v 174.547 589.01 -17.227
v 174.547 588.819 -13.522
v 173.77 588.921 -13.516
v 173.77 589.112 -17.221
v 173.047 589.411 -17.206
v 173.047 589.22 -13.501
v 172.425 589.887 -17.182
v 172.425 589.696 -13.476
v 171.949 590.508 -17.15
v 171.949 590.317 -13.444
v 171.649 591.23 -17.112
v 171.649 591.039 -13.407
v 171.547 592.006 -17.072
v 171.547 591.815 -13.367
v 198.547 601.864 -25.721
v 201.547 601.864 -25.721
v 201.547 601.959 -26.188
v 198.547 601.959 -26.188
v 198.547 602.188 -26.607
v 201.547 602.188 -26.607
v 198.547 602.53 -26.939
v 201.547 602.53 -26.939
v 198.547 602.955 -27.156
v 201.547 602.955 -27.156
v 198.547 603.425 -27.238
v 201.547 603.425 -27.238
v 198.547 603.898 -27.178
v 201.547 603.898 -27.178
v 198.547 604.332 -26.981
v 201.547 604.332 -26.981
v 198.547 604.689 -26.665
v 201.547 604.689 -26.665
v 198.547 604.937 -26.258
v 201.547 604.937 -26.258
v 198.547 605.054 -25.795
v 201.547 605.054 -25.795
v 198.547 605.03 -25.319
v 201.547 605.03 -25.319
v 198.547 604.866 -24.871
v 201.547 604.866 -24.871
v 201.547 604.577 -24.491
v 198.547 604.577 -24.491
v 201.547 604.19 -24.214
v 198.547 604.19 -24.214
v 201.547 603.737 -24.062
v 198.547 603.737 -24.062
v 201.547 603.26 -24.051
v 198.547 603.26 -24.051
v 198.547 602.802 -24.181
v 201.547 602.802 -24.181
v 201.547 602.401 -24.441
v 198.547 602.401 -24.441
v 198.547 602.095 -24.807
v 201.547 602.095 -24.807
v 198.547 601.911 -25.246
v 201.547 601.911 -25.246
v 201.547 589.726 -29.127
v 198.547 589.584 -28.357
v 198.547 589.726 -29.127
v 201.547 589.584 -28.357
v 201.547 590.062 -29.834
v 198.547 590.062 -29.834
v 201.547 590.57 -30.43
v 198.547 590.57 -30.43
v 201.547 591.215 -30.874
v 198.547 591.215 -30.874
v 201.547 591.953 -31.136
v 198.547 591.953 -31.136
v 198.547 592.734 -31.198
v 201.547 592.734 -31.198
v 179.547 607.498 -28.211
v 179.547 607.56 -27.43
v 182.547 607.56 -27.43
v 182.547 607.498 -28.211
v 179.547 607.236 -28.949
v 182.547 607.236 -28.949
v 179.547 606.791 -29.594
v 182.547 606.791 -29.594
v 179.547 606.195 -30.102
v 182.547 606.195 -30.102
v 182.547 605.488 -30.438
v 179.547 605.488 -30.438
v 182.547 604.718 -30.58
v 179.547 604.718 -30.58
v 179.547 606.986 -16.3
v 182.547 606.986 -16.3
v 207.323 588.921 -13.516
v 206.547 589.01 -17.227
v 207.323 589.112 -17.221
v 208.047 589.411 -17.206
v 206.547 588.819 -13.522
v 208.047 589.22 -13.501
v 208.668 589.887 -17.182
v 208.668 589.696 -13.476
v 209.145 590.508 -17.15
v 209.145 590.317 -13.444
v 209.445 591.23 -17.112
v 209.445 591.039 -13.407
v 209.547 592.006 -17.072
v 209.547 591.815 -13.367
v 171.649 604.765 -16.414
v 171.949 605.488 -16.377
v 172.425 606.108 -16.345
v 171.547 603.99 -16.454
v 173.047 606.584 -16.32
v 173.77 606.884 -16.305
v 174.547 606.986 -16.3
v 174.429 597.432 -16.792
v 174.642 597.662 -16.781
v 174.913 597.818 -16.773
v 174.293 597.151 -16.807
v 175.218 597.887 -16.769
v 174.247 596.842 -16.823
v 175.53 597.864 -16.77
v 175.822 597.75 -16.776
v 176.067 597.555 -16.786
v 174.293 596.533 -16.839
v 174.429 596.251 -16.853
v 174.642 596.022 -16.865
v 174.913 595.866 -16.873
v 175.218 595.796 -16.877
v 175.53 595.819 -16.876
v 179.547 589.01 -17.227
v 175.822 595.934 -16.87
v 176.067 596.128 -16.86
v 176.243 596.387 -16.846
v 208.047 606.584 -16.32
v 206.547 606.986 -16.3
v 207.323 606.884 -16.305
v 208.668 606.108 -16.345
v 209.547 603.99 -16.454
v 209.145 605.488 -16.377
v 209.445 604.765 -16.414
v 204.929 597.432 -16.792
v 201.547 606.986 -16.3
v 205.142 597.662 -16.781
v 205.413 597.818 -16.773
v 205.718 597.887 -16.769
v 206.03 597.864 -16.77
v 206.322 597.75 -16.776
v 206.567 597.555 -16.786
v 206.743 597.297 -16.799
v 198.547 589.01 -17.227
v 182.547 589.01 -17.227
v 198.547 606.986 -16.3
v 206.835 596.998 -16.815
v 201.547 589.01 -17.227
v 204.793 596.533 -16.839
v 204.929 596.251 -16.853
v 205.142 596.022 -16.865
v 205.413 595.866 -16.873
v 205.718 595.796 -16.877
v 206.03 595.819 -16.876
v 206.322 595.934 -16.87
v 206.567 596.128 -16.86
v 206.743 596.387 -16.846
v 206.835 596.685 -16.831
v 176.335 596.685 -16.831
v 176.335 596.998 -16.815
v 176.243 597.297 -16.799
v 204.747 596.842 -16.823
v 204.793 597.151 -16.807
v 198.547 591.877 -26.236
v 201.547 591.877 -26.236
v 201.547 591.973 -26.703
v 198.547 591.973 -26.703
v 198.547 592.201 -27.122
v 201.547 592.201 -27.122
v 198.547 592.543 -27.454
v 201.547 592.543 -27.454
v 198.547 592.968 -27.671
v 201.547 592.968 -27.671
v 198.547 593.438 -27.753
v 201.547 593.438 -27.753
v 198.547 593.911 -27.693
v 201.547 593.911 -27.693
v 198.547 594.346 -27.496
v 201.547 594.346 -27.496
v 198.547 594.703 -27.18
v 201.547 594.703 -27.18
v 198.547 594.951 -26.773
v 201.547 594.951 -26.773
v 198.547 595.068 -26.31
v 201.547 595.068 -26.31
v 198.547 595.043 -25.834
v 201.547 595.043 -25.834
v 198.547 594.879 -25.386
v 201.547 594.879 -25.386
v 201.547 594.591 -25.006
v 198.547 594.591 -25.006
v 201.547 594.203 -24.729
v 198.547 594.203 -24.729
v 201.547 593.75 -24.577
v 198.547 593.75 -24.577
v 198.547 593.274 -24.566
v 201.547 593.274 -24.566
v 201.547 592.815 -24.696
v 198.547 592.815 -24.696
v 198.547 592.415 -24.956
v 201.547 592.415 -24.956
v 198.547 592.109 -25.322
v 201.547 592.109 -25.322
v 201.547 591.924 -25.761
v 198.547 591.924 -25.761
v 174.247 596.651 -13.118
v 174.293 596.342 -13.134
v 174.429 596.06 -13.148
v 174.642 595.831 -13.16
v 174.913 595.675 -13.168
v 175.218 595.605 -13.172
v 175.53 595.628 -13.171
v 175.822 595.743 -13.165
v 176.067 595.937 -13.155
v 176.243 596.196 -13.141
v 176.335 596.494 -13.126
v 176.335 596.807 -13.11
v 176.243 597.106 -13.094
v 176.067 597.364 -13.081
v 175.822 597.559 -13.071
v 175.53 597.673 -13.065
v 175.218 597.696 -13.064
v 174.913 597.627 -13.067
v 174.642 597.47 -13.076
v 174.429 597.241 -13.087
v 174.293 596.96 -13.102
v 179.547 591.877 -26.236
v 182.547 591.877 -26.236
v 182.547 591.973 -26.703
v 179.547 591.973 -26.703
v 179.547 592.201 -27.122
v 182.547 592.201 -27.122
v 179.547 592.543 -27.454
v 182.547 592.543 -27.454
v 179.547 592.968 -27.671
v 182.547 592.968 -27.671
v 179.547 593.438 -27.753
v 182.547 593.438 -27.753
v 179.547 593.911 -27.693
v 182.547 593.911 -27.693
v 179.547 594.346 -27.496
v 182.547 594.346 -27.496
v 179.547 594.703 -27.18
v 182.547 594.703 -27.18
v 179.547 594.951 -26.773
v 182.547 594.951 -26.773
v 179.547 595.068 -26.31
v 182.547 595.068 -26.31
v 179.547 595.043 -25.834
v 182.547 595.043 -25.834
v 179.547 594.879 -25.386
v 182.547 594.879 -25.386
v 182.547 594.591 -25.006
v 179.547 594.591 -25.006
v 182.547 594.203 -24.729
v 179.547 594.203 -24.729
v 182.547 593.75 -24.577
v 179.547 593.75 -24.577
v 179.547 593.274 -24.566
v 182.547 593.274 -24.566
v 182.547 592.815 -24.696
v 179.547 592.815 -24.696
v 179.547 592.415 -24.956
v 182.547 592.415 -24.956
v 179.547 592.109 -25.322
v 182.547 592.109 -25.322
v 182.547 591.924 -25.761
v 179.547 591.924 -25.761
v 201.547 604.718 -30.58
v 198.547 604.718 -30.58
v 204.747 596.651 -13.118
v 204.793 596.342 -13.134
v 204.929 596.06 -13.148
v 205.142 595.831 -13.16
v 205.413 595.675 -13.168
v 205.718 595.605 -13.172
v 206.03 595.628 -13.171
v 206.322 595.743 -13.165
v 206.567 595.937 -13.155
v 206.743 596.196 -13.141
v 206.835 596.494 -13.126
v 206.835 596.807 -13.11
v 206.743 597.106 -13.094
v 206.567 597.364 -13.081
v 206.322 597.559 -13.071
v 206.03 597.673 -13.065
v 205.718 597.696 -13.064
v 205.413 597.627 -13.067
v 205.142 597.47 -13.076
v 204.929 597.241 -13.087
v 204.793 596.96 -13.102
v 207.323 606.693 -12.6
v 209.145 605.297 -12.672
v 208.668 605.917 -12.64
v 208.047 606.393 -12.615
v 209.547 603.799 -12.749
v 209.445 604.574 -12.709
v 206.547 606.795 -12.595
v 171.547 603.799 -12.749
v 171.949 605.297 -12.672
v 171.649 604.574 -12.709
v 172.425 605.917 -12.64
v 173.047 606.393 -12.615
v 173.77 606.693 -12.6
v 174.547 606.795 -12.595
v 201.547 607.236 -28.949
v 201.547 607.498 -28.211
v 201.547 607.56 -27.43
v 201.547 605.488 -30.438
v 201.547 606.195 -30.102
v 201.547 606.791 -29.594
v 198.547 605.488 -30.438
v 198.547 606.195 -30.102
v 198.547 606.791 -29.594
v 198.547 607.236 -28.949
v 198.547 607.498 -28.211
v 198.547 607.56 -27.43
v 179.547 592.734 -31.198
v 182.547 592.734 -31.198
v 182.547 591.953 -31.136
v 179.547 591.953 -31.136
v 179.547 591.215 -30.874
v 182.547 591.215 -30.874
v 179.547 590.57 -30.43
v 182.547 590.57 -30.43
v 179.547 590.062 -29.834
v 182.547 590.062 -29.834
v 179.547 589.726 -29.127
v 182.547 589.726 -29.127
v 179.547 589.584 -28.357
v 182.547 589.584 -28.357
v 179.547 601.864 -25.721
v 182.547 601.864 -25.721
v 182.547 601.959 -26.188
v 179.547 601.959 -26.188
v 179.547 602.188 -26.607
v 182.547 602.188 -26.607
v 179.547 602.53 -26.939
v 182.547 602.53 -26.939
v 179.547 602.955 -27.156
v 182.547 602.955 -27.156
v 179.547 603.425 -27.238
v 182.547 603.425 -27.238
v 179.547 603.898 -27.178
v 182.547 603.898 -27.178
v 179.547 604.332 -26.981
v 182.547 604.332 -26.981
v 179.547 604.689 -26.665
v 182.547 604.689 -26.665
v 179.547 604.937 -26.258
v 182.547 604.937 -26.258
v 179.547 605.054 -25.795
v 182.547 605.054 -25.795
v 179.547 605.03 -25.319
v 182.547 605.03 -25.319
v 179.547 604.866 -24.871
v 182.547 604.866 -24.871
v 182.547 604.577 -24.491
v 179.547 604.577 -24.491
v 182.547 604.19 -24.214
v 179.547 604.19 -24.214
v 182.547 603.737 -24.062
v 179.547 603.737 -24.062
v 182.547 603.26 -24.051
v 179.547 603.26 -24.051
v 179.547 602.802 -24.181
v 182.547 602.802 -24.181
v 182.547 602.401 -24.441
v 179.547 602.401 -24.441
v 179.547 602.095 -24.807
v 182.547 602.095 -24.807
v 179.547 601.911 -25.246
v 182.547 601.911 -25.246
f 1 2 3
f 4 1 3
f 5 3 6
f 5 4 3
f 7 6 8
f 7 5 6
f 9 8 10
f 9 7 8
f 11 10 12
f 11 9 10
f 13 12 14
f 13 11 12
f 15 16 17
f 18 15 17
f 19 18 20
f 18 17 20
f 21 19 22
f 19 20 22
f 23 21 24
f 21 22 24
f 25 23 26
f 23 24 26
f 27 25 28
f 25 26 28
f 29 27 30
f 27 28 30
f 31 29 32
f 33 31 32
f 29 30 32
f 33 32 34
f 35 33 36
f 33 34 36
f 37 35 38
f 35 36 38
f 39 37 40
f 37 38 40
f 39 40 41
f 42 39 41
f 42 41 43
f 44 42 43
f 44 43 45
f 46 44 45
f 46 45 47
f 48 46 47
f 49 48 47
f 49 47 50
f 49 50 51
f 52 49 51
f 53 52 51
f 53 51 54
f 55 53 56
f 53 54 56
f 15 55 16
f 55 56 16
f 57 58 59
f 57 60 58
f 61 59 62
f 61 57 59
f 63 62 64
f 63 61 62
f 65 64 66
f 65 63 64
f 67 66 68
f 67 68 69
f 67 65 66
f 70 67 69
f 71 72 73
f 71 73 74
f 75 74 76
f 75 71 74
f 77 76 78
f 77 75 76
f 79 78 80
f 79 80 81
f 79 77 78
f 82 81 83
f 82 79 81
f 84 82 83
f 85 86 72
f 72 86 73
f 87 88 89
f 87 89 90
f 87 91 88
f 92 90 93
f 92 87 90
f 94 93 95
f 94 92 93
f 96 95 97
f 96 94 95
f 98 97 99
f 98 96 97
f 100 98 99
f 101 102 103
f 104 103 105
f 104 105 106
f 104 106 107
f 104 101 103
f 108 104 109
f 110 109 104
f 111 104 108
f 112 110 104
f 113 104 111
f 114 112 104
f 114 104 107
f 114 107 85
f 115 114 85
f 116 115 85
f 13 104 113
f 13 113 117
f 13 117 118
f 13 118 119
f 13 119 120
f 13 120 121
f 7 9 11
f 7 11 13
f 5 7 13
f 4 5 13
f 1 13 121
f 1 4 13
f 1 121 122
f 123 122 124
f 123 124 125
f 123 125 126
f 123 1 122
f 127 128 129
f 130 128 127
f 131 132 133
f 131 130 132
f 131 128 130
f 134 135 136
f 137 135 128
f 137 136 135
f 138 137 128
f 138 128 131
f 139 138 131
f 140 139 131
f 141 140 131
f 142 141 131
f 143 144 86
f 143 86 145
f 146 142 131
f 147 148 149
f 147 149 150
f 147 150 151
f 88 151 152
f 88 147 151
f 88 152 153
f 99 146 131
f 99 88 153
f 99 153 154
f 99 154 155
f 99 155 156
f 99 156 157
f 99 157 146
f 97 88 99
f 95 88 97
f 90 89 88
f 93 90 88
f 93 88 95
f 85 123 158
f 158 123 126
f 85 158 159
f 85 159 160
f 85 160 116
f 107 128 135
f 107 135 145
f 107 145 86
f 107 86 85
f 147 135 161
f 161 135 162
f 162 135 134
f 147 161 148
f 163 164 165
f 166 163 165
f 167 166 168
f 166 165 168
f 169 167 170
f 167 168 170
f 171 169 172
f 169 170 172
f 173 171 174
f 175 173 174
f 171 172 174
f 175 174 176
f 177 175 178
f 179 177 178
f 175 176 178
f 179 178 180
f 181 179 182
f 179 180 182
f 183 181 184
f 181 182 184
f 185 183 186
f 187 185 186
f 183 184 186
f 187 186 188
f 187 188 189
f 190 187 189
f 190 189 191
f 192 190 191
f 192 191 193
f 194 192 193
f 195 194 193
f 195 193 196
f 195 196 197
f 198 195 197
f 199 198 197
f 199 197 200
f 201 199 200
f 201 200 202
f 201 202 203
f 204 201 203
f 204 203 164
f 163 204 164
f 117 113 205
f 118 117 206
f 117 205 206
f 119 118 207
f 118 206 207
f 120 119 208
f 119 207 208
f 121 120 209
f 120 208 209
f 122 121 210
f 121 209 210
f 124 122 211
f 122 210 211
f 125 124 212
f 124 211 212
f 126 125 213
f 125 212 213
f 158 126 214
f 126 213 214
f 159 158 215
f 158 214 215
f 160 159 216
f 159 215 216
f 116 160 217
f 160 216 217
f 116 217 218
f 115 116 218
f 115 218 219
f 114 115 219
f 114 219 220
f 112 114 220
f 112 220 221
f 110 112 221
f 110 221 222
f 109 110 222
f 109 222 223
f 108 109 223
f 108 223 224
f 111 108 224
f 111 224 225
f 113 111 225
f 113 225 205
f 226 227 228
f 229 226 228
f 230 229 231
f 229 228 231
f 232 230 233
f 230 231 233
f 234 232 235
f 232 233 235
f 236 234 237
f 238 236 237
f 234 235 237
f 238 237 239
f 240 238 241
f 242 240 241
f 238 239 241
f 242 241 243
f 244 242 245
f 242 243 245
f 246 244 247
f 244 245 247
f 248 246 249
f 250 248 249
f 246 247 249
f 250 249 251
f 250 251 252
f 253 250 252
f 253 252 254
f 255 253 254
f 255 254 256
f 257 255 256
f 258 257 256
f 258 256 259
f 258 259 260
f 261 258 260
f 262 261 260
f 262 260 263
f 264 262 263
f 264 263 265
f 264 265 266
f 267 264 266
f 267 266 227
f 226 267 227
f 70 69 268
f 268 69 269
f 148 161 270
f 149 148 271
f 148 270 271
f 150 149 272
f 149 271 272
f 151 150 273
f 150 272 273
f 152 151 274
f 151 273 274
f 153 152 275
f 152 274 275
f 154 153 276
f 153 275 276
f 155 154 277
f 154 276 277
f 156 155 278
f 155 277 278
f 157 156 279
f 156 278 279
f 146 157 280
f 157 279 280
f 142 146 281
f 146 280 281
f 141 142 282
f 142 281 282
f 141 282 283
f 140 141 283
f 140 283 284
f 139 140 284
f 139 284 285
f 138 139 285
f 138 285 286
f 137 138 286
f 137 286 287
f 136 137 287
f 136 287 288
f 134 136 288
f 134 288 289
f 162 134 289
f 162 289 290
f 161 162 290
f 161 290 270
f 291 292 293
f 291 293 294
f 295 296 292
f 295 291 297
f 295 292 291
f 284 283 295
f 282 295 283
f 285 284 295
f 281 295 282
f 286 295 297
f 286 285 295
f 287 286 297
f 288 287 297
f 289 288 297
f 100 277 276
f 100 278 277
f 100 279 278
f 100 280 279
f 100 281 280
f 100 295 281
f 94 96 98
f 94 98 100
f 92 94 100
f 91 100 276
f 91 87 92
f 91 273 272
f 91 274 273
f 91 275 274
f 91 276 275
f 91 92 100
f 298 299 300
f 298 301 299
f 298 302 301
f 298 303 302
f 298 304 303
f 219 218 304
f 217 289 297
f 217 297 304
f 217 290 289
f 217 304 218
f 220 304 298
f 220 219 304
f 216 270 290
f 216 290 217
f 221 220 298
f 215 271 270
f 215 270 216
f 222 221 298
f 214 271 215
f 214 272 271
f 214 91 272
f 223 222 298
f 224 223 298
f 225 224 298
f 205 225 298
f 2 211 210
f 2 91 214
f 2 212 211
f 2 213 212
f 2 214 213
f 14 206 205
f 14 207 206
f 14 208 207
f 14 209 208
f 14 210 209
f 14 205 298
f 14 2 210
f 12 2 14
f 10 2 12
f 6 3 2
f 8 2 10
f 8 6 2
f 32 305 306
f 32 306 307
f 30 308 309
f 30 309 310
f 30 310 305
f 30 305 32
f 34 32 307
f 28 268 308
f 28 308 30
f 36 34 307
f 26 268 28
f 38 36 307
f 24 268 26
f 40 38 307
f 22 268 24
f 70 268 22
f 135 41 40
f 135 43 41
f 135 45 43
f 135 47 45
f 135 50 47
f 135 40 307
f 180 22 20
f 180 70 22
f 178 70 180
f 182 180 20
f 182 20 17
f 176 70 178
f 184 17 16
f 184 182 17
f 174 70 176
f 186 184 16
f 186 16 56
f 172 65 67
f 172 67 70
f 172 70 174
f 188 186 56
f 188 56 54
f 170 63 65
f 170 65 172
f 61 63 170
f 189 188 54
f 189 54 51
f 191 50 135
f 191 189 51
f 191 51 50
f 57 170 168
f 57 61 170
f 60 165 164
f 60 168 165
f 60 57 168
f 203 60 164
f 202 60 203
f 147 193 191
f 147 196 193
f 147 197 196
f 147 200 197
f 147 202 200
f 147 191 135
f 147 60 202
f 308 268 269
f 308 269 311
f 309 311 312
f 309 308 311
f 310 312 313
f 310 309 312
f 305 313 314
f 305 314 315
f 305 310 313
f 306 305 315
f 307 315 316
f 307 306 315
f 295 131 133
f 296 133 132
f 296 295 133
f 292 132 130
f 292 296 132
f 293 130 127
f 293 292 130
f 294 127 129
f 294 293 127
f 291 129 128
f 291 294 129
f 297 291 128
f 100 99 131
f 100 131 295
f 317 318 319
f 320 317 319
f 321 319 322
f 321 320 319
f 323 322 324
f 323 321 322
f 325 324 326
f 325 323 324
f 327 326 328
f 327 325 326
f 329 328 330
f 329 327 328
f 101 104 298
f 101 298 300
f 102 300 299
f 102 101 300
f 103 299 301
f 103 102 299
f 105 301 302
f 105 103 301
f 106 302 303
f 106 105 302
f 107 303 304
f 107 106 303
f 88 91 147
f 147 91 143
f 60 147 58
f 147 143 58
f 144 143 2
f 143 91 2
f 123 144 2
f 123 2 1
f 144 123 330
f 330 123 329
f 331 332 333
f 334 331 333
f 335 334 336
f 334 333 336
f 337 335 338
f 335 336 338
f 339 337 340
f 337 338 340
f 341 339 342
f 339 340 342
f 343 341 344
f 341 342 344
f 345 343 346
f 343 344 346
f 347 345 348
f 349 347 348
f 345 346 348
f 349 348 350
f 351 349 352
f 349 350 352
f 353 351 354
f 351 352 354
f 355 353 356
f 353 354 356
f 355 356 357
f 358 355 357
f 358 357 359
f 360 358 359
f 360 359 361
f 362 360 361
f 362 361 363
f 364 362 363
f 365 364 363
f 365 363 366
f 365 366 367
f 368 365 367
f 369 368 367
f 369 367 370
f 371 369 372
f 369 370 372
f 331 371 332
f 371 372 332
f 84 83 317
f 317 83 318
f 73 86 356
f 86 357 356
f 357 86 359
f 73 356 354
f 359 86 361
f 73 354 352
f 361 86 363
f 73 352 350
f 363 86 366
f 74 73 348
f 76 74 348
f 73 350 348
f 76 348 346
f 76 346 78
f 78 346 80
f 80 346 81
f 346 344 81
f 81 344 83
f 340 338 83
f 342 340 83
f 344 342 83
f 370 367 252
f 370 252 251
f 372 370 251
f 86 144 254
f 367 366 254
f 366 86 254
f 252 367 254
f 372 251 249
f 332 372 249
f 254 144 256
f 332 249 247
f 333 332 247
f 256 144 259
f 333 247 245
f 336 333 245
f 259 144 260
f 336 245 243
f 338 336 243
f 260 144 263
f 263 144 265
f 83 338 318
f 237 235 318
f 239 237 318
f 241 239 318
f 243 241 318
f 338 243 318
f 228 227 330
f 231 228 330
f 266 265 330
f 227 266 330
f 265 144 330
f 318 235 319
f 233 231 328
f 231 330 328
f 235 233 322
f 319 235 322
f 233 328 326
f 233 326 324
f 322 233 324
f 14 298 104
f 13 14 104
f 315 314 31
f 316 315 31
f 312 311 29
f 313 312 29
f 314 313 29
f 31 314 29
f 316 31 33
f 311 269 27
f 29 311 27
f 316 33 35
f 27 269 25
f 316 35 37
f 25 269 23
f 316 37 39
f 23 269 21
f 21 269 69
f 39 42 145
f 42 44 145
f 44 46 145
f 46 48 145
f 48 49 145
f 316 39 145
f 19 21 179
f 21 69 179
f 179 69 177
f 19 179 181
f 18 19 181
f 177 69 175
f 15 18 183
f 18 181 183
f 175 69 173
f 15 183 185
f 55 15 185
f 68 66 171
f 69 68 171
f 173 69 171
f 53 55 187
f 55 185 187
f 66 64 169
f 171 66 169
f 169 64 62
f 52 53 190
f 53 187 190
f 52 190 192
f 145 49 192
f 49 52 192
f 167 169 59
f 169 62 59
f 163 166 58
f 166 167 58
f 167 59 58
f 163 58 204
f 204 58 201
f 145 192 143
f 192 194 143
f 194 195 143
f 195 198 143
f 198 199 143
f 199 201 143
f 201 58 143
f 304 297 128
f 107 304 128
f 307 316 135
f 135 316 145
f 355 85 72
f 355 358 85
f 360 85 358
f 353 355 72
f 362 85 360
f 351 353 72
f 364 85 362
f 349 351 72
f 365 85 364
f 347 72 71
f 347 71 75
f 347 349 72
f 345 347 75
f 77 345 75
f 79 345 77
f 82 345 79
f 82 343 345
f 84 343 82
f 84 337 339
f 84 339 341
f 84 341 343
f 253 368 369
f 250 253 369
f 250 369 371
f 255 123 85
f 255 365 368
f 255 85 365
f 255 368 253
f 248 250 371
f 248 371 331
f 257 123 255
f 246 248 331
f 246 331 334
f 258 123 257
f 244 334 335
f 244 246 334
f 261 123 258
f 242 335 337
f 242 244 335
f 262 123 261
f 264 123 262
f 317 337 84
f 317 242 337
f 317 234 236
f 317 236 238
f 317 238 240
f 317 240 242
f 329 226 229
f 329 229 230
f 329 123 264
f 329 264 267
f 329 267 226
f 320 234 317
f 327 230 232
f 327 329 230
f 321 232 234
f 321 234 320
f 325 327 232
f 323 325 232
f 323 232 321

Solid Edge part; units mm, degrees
sketch "Sketch1" plane through (198.5468, 0, 0) normal (1, 0, 0) x (0, 1, 0)
  line L0 (588.9141, -15.3741) -> (589.7381, -31.3529)
  line L1 (589.7381, -31.3529) -> (607.7142, -30.426)
  line L2 (607.7142, -30.426) -> (606.8902, -14.4472)
  line L3 (606.8902, -14.4472) -> (588.9141, -15.3741)
extrude "Protrusion1" add sketch "Sketch1" along normal blind 3
mirror "Mirror1" about plane through (190.5468, 0, 0) normal (1, 0, 0) of "Protrusion1"
sketch "Sketch2" plane through (200.0468, 589.3261, -23.3635) normal (0, -0.9987, -0.0515) x (0, 0.0515, -0.9987)
  line L0 (-9.8549, 9.5) -> (-9.8549, -28.5)
  line L1 (-9.8549, -28.5) -> (-6.1449, -28.5)
  line L2 (-6.1449, -28.5) -> (-6.1449, 9.5)
  line L3 (-6.1449, 9.5) -> (-9.8549, 9.5)
extrude "Protrusion2" add sketch "Sketch2" against normal up to vertex (18 mm away)
fillet "Round_2" radius 3 8 edges at (209.5468, 588.9141, -15.3741) (209.5468, 606.8902, -14.4472) (200.0468, 589.7381, -31.3529) (200.0468, 607.7142, -30.426) (181.0468, 589.7381, -31.3529) (171.5468, 588.9141, -15.3741) (181.0468, 607.7142, -30.426) (171.5468, 606.8902, -14.4472)
sketch "Sketch3" plane through (190.5468, 597.8066, -13.0581) normal (0, -0.0515, 0.9987) x (-1, 0, 0)
  circle A0 centre (-15.25, 1.1575) radius 1.05
  circle A1 centre (15.25, 1.1575) radius 1.05
  dimension "D1" = 2.1
  dimension "D2" = 2.1
  dimension "D3" = 30.5
  dimension "D4" = 3.75
  dimension "D5" = 7.8425
extrude "Cutout1" cut sketch "Sketch3" against normal up to next
sketch "Sketch4" plane through (201.5468, 598.2866, -23.751) normal (1, 0, 0) x (0, -0.9987, -0.0515)
  circle A0 centre (4.9287, 2.1516) radius 1.6
  circle A1 centre (-5.0713, 2.1516) radius 1.6
  dimension "D1" = 3.2
  dimension "D2" = 3.2
  dimension "D3" = 5
  dimension "D4" = 10
extrude "Cutout2" cut sketch "Sketch4" against normal through all
properties material "ABS 40% Infill"
